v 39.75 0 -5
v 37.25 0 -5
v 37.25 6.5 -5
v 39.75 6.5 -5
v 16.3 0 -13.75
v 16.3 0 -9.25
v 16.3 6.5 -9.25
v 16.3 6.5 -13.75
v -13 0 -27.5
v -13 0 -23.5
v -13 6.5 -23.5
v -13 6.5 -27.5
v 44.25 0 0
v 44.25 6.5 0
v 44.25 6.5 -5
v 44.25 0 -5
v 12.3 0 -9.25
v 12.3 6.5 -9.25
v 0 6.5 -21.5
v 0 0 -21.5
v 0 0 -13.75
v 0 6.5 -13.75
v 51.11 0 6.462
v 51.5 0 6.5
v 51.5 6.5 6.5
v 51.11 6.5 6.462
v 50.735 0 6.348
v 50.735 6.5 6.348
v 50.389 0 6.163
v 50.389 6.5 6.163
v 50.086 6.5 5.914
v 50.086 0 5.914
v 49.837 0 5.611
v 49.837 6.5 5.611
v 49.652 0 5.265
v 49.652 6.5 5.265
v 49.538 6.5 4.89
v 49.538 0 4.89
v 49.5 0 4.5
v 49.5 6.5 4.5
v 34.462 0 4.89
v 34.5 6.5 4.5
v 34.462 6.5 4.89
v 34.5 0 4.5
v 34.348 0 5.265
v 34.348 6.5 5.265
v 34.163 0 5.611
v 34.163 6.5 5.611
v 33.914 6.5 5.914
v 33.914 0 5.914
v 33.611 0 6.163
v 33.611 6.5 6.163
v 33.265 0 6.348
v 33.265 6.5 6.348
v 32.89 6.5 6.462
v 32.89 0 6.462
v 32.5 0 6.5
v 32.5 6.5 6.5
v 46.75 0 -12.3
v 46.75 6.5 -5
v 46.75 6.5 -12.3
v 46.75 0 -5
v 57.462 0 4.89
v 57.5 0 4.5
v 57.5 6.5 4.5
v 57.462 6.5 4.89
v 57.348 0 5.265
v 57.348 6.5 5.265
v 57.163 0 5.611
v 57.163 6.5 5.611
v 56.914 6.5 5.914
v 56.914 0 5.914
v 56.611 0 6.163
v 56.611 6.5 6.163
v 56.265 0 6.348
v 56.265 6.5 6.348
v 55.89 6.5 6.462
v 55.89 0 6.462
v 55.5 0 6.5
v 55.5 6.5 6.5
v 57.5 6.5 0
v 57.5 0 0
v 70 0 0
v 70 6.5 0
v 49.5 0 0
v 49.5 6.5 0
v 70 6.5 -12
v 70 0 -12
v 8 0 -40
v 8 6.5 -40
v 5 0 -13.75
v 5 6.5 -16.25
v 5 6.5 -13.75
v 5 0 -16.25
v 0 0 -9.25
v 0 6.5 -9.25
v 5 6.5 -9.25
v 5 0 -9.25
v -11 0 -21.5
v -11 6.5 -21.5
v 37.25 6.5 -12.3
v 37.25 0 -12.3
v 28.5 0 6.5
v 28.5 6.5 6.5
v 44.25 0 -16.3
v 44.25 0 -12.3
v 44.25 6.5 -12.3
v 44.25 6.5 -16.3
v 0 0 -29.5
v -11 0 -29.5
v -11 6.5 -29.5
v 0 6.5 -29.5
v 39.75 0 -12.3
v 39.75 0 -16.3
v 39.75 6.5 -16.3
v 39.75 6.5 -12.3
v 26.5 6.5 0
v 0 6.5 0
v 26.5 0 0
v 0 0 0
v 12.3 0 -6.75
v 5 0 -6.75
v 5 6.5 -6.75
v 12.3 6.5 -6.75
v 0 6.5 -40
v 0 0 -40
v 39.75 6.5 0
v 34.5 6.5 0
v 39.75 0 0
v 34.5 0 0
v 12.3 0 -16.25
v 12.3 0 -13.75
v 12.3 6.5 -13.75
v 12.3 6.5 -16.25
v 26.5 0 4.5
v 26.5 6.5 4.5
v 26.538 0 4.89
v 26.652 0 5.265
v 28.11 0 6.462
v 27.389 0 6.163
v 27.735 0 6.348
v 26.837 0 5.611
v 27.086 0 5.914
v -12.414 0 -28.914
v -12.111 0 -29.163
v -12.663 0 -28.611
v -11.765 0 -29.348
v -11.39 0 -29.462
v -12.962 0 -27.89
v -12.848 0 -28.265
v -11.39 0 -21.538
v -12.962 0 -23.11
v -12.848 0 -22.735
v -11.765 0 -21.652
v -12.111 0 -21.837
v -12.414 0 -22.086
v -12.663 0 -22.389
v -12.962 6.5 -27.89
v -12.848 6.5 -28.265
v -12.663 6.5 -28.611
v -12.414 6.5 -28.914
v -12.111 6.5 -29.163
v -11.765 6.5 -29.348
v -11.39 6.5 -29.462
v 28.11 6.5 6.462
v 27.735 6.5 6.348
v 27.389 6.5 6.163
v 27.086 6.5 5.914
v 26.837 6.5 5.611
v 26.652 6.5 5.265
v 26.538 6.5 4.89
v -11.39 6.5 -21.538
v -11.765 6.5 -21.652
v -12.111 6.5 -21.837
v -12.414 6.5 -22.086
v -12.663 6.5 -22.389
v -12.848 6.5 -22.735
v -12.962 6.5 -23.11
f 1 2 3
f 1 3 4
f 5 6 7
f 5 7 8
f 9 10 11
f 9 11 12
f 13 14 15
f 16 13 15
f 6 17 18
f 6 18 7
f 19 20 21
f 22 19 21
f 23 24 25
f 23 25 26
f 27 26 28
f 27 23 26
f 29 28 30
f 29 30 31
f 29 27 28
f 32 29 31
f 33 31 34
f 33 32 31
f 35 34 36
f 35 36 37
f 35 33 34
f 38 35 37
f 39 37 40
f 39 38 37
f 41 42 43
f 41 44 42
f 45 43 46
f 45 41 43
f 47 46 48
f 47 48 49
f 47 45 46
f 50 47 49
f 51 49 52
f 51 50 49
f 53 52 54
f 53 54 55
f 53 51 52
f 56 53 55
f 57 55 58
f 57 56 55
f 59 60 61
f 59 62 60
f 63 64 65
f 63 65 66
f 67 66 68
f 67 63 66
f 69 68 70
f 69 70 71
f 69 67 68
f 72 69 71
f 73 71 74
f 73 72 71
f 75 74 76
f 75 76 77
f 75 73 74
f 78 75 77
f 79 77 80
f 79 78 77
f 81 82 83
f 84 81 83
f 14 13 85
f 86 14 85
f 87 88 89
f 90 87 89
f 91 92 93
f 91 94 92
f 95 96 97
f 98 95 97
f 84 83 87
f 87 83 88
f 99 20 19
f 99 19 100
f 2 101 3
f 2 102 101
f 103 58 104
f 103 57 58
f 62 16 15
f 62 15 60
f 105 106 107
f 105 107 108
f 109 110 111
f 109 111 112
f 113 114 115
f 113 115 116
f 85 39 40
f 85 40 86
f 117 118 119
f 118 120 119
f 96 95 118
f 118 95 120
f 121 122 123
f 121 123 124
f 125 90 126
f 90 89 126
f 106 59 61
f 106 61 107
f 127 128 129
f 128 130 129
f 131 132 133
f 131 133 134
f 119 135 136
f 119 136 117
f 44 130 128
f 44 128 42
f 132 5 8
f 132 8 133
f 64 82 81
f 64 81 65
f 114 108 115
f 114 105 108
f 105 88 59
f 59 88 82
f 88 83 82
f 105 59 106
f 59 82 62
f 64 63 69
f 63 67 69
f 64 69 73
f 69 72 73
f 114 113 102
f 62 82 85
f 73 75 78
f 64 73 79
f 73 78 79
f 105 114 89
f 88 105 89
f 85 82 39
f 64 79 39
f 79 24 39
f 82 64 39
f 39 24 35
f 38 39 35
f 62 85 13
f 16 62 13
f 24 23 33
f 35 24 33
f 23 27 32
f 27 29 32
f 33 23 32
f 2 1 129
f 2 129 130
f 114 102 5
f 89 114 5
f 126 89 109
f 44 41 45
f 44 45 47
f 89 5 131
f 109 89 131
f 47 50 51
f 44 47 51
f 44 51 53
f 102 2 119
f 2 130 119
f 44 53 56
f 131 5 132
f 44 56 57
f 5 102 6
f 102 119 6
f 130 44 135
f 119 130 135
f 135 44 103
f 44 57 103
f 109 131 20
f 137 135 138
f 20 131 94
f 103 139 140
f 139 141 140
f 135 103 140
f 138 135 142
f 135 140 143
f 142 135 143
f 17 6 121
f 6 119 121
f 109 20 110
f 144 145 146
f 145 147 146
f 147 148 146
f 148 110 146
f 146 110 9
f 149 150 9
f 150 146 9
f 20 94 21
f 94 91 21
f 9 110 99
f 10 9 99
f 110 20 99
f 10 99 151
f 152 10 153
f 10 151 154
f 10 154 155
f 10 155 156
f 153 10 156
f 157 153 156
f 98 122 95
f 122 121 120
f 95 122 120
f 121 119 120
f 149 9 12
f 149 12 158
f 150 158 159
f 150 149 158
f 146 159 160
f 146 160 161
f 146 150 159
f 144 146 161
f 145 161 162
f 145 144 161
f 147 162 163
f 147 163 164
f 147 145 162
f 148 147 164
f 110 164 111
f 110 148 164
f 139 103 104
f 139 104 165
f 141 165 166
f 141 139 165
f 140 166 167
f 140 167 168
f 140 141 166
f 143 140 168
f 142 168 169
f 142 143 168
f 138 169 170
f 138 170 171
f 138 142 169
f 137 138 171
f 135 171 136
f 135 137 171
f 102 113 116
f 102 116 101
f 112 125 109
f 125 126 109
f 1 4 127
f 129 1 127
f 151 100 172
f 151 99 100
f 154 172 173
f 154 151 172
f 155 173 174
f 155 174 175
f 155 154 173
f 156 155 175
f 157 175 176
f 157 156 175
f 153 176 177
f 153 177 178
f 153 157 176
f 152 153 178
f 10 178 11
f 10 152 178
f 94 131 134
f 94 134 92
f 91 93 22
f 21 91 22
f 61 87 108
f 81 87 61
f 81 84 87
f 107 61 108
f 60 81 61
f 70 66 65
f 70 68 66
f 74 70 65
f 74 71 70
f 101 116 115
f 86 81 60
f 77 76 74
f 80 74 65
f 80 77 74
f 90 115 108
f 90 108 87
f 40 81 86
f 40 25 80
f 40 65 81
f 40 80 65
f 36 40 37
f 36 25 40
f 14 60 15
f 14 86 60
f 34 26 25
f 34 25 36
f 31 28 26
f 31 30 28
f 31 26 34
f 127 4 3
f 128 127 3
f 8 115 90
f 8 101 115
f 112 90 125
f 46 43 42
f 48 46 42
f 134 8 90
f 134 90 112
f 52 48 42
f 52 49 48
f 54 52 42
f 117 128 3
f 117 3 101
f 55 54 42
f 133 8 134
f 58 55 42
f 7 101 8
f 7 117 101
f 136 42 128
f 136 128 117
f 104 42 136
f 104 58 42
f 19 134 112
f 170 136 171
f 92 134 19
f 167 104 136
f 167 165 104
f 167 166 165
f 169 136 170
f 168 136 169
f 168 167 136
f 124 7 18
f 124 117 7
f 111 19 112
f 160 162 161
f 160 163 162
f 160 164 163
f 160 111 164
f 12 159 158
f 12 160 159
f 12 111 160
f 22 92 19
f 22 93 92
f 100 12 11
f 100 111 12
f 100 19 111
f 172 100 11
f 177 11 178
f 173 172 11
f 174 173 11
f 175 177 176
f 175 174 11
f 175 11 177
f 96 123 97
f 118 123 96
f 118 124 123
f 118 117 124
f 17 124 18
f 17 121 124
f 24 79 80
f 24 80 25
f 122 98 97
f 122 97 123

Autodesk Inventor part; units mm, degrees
ref_plane "YZ Plane" through (0, 0, 0) normal (1, 0, 0) x (0, 1, 0)
ref_plane "XZ Plane" through (0, 0, 0) normal (0, 1, 0) x (-1, 0, 0)
ref_plane "XY Plane" through (0, 0, 0) normal (0, 0, 1) x (1, 0, 0)
sketch "Sketch1" plane through (0, 0, 0) normal (0, 1, 0) x (-1, 0, 0)
  line L0 (0, -40) -> (0, 0)
  line L1 (0, 0) -> (-70, 0)
  line L2 (-70, 0) -> (-70, -12)
  line L3 (-70, -12) -> (-8, -40)
  line L4 (-8, -40) -> (0, -40)
  dimension "d0" = 8
  dimension "d1" = 12
  dimension "d2" = 70
  dimension "d3" = 40
extrude "Extrusion1" add sketch "Sketch1" along normal blind 6.5
sketch "Sketch2" plane through (0, 0, 0) normal (0, -1, 0) x (1, 0, 0)
  line L0 (0, 0) -> (0, -40) projected
  line L1 (70, 0) -> (0, 0) projected
  line L2 (39.75, 0) -> (44.25, 0)
  line L3 (44.25, -16.3) -> (39.75, -16.3)
  line L4 (46.75, -5) -> (46.75, -12.3)
  line L5 (37.25, -12.3) -> (37.25, -5)
  line L6 (37.25, -5) -> (39.75, -5)
  line L7 (44.25, -5) -> (46.75, -5)
  line L8 (46.75, -12.3) -> (44.25, -12.3)
  line L9 (39.75, -12.3) -> (37.25, -12.3)
  line L10 (39.75, -16.3) -> (39.75, -12.3)
  line L11 (39.75, -5) -> (39.75, 0)
  line L12 (44.25, 0) -> (44.25, -5)
  line L13 (44.25, -12.3) -> (44.25, -16.3)
  line L14 (0, -13.75) -> (0, -9.25)
  line L15 (16.3, -9.25) -> (16.3, -13.75)
  line L16 (5, -6.75) -> (12.3, -6.75)
  line L17 (12.3, -16.25) -> (5, -16.25)
  line L18 (5, -16.25) -> (5, -13.75)
  line L19 (5, -9.25) -> (5, -6.75)
  line L20 (12.3, -6.75) -> (12.3, -9.25)
  line L21 (12.3, -13.75) -> (12.3, -16.25)
  line L22 (16.3, -13.75) -> (12.3, -13.75)
  line L23 (5, -13.75) -> (0, -13.75)
  line L24 (0, -9.25) -> (5, -9.25)
  line L25 (12.3, -9.25) -> (16.3, -9.25)
  point P0 (42, -16.3)
  point P1 (16.3, -11.5)
  dimension "d6" = 4.5
  dimension "d7" = 4
  dimension "d8" = 5
  dimension "d9" = 7.3
  dimension "d10" = 2.5
  dimension "d11" = 4.5
  dimension "d12" = 4
  dimension "d13" = 5
  dimension "d14" = 7.3
  dimension "d15" = 2.5
  dimension "d16" = 42
  dimension "d17" = 11.5
extrude "Extrusion2" cut sketch "Sketch2" against normal through all
sketch "Sketch3" plane through (0, 0, 0) normal (0, -1, 0) x (1, 0, 0)
  line L0 (39.75, 0) -> (0, 0) projected
  line L1 (16.3, -9.25) -> (16.3, -13.75) projected
  line L2 (0, -13.75) -> (0, -40) projected
  line L3 (70, 0) -> (44.25, 0) projected
  line L4 (44.25, -16.3) -> (39.75, -16.3) projected
  line L5 (26.5, 0) -> (34.5, 0)
  line L6 (34.5, 0) -> (34.5, 4.5)
  line L7 (32.5, 6.5) -> (28.5, 6.5)
  line L8 (26.5, 4.5) -> (26.5, 0)
  line L9 (49.5, 0) -> (57.5, 0)
  line L10 (57.5, 0) -> (57.5, 4.5)
  line L11 (55.5, 6.5) -> (51.5, 6.5)
  line L12 (49.5, 4.5) -> (49.5, 0)
  line L13 (0, -21.5) -> (-11, -21.5)
  line L14 (-13, -23.5) -> (-13, -27.5)
  line L15 (-11, -29.5) -> (0, -29.5)
  line L16 (0, -29.5) -> (0, -21.5)
  arc A0 (28.5, 6.5) -> (26.5, 4.5) centre (28.5, 4.5) ccw
  arc A1 (34.5, 4.5) -> (32.5, 6.5) centre (32.5, 4.5) ccw
  arc A2 (51.5, 6.5) -> (49.5, 4.5) centre (51.5, 4.5) ccw
  arc A3 (57.5, 4.5) -> (55.5, 6.5) centre (55.5, 4.5) ccw
  arc A4 (-11, -21.5) -> (-13, -23.5) centre (-11, -23.5) ccw
  arc A5 (-13, -27.5) -> (-11, -29.5) centre (-11, -27.5) ccw
  point P0 (16.3, -11.5)
  point P1 (42, -16.3)
  dimension "d20" = 2
  dimension "d21" = 8
  dimension "d22" = 8
  dimension "d23" = 8
  dimension "d24" = 6.5
  dimension "d25" = 15
  dimension "d26" = 13
  dimension "d27" = 7.5
  dimension "d28" = 10
extrude "Extrusion3" add sketch "Sketch3" against normal blind 6.5
equation "\"d22\" = d21"
equation "\"d23\" = d22"
equation "\"d27\" = 0.5 * d25"
properties part number "z_axis_top_brace" material "Plywood, Finish"
